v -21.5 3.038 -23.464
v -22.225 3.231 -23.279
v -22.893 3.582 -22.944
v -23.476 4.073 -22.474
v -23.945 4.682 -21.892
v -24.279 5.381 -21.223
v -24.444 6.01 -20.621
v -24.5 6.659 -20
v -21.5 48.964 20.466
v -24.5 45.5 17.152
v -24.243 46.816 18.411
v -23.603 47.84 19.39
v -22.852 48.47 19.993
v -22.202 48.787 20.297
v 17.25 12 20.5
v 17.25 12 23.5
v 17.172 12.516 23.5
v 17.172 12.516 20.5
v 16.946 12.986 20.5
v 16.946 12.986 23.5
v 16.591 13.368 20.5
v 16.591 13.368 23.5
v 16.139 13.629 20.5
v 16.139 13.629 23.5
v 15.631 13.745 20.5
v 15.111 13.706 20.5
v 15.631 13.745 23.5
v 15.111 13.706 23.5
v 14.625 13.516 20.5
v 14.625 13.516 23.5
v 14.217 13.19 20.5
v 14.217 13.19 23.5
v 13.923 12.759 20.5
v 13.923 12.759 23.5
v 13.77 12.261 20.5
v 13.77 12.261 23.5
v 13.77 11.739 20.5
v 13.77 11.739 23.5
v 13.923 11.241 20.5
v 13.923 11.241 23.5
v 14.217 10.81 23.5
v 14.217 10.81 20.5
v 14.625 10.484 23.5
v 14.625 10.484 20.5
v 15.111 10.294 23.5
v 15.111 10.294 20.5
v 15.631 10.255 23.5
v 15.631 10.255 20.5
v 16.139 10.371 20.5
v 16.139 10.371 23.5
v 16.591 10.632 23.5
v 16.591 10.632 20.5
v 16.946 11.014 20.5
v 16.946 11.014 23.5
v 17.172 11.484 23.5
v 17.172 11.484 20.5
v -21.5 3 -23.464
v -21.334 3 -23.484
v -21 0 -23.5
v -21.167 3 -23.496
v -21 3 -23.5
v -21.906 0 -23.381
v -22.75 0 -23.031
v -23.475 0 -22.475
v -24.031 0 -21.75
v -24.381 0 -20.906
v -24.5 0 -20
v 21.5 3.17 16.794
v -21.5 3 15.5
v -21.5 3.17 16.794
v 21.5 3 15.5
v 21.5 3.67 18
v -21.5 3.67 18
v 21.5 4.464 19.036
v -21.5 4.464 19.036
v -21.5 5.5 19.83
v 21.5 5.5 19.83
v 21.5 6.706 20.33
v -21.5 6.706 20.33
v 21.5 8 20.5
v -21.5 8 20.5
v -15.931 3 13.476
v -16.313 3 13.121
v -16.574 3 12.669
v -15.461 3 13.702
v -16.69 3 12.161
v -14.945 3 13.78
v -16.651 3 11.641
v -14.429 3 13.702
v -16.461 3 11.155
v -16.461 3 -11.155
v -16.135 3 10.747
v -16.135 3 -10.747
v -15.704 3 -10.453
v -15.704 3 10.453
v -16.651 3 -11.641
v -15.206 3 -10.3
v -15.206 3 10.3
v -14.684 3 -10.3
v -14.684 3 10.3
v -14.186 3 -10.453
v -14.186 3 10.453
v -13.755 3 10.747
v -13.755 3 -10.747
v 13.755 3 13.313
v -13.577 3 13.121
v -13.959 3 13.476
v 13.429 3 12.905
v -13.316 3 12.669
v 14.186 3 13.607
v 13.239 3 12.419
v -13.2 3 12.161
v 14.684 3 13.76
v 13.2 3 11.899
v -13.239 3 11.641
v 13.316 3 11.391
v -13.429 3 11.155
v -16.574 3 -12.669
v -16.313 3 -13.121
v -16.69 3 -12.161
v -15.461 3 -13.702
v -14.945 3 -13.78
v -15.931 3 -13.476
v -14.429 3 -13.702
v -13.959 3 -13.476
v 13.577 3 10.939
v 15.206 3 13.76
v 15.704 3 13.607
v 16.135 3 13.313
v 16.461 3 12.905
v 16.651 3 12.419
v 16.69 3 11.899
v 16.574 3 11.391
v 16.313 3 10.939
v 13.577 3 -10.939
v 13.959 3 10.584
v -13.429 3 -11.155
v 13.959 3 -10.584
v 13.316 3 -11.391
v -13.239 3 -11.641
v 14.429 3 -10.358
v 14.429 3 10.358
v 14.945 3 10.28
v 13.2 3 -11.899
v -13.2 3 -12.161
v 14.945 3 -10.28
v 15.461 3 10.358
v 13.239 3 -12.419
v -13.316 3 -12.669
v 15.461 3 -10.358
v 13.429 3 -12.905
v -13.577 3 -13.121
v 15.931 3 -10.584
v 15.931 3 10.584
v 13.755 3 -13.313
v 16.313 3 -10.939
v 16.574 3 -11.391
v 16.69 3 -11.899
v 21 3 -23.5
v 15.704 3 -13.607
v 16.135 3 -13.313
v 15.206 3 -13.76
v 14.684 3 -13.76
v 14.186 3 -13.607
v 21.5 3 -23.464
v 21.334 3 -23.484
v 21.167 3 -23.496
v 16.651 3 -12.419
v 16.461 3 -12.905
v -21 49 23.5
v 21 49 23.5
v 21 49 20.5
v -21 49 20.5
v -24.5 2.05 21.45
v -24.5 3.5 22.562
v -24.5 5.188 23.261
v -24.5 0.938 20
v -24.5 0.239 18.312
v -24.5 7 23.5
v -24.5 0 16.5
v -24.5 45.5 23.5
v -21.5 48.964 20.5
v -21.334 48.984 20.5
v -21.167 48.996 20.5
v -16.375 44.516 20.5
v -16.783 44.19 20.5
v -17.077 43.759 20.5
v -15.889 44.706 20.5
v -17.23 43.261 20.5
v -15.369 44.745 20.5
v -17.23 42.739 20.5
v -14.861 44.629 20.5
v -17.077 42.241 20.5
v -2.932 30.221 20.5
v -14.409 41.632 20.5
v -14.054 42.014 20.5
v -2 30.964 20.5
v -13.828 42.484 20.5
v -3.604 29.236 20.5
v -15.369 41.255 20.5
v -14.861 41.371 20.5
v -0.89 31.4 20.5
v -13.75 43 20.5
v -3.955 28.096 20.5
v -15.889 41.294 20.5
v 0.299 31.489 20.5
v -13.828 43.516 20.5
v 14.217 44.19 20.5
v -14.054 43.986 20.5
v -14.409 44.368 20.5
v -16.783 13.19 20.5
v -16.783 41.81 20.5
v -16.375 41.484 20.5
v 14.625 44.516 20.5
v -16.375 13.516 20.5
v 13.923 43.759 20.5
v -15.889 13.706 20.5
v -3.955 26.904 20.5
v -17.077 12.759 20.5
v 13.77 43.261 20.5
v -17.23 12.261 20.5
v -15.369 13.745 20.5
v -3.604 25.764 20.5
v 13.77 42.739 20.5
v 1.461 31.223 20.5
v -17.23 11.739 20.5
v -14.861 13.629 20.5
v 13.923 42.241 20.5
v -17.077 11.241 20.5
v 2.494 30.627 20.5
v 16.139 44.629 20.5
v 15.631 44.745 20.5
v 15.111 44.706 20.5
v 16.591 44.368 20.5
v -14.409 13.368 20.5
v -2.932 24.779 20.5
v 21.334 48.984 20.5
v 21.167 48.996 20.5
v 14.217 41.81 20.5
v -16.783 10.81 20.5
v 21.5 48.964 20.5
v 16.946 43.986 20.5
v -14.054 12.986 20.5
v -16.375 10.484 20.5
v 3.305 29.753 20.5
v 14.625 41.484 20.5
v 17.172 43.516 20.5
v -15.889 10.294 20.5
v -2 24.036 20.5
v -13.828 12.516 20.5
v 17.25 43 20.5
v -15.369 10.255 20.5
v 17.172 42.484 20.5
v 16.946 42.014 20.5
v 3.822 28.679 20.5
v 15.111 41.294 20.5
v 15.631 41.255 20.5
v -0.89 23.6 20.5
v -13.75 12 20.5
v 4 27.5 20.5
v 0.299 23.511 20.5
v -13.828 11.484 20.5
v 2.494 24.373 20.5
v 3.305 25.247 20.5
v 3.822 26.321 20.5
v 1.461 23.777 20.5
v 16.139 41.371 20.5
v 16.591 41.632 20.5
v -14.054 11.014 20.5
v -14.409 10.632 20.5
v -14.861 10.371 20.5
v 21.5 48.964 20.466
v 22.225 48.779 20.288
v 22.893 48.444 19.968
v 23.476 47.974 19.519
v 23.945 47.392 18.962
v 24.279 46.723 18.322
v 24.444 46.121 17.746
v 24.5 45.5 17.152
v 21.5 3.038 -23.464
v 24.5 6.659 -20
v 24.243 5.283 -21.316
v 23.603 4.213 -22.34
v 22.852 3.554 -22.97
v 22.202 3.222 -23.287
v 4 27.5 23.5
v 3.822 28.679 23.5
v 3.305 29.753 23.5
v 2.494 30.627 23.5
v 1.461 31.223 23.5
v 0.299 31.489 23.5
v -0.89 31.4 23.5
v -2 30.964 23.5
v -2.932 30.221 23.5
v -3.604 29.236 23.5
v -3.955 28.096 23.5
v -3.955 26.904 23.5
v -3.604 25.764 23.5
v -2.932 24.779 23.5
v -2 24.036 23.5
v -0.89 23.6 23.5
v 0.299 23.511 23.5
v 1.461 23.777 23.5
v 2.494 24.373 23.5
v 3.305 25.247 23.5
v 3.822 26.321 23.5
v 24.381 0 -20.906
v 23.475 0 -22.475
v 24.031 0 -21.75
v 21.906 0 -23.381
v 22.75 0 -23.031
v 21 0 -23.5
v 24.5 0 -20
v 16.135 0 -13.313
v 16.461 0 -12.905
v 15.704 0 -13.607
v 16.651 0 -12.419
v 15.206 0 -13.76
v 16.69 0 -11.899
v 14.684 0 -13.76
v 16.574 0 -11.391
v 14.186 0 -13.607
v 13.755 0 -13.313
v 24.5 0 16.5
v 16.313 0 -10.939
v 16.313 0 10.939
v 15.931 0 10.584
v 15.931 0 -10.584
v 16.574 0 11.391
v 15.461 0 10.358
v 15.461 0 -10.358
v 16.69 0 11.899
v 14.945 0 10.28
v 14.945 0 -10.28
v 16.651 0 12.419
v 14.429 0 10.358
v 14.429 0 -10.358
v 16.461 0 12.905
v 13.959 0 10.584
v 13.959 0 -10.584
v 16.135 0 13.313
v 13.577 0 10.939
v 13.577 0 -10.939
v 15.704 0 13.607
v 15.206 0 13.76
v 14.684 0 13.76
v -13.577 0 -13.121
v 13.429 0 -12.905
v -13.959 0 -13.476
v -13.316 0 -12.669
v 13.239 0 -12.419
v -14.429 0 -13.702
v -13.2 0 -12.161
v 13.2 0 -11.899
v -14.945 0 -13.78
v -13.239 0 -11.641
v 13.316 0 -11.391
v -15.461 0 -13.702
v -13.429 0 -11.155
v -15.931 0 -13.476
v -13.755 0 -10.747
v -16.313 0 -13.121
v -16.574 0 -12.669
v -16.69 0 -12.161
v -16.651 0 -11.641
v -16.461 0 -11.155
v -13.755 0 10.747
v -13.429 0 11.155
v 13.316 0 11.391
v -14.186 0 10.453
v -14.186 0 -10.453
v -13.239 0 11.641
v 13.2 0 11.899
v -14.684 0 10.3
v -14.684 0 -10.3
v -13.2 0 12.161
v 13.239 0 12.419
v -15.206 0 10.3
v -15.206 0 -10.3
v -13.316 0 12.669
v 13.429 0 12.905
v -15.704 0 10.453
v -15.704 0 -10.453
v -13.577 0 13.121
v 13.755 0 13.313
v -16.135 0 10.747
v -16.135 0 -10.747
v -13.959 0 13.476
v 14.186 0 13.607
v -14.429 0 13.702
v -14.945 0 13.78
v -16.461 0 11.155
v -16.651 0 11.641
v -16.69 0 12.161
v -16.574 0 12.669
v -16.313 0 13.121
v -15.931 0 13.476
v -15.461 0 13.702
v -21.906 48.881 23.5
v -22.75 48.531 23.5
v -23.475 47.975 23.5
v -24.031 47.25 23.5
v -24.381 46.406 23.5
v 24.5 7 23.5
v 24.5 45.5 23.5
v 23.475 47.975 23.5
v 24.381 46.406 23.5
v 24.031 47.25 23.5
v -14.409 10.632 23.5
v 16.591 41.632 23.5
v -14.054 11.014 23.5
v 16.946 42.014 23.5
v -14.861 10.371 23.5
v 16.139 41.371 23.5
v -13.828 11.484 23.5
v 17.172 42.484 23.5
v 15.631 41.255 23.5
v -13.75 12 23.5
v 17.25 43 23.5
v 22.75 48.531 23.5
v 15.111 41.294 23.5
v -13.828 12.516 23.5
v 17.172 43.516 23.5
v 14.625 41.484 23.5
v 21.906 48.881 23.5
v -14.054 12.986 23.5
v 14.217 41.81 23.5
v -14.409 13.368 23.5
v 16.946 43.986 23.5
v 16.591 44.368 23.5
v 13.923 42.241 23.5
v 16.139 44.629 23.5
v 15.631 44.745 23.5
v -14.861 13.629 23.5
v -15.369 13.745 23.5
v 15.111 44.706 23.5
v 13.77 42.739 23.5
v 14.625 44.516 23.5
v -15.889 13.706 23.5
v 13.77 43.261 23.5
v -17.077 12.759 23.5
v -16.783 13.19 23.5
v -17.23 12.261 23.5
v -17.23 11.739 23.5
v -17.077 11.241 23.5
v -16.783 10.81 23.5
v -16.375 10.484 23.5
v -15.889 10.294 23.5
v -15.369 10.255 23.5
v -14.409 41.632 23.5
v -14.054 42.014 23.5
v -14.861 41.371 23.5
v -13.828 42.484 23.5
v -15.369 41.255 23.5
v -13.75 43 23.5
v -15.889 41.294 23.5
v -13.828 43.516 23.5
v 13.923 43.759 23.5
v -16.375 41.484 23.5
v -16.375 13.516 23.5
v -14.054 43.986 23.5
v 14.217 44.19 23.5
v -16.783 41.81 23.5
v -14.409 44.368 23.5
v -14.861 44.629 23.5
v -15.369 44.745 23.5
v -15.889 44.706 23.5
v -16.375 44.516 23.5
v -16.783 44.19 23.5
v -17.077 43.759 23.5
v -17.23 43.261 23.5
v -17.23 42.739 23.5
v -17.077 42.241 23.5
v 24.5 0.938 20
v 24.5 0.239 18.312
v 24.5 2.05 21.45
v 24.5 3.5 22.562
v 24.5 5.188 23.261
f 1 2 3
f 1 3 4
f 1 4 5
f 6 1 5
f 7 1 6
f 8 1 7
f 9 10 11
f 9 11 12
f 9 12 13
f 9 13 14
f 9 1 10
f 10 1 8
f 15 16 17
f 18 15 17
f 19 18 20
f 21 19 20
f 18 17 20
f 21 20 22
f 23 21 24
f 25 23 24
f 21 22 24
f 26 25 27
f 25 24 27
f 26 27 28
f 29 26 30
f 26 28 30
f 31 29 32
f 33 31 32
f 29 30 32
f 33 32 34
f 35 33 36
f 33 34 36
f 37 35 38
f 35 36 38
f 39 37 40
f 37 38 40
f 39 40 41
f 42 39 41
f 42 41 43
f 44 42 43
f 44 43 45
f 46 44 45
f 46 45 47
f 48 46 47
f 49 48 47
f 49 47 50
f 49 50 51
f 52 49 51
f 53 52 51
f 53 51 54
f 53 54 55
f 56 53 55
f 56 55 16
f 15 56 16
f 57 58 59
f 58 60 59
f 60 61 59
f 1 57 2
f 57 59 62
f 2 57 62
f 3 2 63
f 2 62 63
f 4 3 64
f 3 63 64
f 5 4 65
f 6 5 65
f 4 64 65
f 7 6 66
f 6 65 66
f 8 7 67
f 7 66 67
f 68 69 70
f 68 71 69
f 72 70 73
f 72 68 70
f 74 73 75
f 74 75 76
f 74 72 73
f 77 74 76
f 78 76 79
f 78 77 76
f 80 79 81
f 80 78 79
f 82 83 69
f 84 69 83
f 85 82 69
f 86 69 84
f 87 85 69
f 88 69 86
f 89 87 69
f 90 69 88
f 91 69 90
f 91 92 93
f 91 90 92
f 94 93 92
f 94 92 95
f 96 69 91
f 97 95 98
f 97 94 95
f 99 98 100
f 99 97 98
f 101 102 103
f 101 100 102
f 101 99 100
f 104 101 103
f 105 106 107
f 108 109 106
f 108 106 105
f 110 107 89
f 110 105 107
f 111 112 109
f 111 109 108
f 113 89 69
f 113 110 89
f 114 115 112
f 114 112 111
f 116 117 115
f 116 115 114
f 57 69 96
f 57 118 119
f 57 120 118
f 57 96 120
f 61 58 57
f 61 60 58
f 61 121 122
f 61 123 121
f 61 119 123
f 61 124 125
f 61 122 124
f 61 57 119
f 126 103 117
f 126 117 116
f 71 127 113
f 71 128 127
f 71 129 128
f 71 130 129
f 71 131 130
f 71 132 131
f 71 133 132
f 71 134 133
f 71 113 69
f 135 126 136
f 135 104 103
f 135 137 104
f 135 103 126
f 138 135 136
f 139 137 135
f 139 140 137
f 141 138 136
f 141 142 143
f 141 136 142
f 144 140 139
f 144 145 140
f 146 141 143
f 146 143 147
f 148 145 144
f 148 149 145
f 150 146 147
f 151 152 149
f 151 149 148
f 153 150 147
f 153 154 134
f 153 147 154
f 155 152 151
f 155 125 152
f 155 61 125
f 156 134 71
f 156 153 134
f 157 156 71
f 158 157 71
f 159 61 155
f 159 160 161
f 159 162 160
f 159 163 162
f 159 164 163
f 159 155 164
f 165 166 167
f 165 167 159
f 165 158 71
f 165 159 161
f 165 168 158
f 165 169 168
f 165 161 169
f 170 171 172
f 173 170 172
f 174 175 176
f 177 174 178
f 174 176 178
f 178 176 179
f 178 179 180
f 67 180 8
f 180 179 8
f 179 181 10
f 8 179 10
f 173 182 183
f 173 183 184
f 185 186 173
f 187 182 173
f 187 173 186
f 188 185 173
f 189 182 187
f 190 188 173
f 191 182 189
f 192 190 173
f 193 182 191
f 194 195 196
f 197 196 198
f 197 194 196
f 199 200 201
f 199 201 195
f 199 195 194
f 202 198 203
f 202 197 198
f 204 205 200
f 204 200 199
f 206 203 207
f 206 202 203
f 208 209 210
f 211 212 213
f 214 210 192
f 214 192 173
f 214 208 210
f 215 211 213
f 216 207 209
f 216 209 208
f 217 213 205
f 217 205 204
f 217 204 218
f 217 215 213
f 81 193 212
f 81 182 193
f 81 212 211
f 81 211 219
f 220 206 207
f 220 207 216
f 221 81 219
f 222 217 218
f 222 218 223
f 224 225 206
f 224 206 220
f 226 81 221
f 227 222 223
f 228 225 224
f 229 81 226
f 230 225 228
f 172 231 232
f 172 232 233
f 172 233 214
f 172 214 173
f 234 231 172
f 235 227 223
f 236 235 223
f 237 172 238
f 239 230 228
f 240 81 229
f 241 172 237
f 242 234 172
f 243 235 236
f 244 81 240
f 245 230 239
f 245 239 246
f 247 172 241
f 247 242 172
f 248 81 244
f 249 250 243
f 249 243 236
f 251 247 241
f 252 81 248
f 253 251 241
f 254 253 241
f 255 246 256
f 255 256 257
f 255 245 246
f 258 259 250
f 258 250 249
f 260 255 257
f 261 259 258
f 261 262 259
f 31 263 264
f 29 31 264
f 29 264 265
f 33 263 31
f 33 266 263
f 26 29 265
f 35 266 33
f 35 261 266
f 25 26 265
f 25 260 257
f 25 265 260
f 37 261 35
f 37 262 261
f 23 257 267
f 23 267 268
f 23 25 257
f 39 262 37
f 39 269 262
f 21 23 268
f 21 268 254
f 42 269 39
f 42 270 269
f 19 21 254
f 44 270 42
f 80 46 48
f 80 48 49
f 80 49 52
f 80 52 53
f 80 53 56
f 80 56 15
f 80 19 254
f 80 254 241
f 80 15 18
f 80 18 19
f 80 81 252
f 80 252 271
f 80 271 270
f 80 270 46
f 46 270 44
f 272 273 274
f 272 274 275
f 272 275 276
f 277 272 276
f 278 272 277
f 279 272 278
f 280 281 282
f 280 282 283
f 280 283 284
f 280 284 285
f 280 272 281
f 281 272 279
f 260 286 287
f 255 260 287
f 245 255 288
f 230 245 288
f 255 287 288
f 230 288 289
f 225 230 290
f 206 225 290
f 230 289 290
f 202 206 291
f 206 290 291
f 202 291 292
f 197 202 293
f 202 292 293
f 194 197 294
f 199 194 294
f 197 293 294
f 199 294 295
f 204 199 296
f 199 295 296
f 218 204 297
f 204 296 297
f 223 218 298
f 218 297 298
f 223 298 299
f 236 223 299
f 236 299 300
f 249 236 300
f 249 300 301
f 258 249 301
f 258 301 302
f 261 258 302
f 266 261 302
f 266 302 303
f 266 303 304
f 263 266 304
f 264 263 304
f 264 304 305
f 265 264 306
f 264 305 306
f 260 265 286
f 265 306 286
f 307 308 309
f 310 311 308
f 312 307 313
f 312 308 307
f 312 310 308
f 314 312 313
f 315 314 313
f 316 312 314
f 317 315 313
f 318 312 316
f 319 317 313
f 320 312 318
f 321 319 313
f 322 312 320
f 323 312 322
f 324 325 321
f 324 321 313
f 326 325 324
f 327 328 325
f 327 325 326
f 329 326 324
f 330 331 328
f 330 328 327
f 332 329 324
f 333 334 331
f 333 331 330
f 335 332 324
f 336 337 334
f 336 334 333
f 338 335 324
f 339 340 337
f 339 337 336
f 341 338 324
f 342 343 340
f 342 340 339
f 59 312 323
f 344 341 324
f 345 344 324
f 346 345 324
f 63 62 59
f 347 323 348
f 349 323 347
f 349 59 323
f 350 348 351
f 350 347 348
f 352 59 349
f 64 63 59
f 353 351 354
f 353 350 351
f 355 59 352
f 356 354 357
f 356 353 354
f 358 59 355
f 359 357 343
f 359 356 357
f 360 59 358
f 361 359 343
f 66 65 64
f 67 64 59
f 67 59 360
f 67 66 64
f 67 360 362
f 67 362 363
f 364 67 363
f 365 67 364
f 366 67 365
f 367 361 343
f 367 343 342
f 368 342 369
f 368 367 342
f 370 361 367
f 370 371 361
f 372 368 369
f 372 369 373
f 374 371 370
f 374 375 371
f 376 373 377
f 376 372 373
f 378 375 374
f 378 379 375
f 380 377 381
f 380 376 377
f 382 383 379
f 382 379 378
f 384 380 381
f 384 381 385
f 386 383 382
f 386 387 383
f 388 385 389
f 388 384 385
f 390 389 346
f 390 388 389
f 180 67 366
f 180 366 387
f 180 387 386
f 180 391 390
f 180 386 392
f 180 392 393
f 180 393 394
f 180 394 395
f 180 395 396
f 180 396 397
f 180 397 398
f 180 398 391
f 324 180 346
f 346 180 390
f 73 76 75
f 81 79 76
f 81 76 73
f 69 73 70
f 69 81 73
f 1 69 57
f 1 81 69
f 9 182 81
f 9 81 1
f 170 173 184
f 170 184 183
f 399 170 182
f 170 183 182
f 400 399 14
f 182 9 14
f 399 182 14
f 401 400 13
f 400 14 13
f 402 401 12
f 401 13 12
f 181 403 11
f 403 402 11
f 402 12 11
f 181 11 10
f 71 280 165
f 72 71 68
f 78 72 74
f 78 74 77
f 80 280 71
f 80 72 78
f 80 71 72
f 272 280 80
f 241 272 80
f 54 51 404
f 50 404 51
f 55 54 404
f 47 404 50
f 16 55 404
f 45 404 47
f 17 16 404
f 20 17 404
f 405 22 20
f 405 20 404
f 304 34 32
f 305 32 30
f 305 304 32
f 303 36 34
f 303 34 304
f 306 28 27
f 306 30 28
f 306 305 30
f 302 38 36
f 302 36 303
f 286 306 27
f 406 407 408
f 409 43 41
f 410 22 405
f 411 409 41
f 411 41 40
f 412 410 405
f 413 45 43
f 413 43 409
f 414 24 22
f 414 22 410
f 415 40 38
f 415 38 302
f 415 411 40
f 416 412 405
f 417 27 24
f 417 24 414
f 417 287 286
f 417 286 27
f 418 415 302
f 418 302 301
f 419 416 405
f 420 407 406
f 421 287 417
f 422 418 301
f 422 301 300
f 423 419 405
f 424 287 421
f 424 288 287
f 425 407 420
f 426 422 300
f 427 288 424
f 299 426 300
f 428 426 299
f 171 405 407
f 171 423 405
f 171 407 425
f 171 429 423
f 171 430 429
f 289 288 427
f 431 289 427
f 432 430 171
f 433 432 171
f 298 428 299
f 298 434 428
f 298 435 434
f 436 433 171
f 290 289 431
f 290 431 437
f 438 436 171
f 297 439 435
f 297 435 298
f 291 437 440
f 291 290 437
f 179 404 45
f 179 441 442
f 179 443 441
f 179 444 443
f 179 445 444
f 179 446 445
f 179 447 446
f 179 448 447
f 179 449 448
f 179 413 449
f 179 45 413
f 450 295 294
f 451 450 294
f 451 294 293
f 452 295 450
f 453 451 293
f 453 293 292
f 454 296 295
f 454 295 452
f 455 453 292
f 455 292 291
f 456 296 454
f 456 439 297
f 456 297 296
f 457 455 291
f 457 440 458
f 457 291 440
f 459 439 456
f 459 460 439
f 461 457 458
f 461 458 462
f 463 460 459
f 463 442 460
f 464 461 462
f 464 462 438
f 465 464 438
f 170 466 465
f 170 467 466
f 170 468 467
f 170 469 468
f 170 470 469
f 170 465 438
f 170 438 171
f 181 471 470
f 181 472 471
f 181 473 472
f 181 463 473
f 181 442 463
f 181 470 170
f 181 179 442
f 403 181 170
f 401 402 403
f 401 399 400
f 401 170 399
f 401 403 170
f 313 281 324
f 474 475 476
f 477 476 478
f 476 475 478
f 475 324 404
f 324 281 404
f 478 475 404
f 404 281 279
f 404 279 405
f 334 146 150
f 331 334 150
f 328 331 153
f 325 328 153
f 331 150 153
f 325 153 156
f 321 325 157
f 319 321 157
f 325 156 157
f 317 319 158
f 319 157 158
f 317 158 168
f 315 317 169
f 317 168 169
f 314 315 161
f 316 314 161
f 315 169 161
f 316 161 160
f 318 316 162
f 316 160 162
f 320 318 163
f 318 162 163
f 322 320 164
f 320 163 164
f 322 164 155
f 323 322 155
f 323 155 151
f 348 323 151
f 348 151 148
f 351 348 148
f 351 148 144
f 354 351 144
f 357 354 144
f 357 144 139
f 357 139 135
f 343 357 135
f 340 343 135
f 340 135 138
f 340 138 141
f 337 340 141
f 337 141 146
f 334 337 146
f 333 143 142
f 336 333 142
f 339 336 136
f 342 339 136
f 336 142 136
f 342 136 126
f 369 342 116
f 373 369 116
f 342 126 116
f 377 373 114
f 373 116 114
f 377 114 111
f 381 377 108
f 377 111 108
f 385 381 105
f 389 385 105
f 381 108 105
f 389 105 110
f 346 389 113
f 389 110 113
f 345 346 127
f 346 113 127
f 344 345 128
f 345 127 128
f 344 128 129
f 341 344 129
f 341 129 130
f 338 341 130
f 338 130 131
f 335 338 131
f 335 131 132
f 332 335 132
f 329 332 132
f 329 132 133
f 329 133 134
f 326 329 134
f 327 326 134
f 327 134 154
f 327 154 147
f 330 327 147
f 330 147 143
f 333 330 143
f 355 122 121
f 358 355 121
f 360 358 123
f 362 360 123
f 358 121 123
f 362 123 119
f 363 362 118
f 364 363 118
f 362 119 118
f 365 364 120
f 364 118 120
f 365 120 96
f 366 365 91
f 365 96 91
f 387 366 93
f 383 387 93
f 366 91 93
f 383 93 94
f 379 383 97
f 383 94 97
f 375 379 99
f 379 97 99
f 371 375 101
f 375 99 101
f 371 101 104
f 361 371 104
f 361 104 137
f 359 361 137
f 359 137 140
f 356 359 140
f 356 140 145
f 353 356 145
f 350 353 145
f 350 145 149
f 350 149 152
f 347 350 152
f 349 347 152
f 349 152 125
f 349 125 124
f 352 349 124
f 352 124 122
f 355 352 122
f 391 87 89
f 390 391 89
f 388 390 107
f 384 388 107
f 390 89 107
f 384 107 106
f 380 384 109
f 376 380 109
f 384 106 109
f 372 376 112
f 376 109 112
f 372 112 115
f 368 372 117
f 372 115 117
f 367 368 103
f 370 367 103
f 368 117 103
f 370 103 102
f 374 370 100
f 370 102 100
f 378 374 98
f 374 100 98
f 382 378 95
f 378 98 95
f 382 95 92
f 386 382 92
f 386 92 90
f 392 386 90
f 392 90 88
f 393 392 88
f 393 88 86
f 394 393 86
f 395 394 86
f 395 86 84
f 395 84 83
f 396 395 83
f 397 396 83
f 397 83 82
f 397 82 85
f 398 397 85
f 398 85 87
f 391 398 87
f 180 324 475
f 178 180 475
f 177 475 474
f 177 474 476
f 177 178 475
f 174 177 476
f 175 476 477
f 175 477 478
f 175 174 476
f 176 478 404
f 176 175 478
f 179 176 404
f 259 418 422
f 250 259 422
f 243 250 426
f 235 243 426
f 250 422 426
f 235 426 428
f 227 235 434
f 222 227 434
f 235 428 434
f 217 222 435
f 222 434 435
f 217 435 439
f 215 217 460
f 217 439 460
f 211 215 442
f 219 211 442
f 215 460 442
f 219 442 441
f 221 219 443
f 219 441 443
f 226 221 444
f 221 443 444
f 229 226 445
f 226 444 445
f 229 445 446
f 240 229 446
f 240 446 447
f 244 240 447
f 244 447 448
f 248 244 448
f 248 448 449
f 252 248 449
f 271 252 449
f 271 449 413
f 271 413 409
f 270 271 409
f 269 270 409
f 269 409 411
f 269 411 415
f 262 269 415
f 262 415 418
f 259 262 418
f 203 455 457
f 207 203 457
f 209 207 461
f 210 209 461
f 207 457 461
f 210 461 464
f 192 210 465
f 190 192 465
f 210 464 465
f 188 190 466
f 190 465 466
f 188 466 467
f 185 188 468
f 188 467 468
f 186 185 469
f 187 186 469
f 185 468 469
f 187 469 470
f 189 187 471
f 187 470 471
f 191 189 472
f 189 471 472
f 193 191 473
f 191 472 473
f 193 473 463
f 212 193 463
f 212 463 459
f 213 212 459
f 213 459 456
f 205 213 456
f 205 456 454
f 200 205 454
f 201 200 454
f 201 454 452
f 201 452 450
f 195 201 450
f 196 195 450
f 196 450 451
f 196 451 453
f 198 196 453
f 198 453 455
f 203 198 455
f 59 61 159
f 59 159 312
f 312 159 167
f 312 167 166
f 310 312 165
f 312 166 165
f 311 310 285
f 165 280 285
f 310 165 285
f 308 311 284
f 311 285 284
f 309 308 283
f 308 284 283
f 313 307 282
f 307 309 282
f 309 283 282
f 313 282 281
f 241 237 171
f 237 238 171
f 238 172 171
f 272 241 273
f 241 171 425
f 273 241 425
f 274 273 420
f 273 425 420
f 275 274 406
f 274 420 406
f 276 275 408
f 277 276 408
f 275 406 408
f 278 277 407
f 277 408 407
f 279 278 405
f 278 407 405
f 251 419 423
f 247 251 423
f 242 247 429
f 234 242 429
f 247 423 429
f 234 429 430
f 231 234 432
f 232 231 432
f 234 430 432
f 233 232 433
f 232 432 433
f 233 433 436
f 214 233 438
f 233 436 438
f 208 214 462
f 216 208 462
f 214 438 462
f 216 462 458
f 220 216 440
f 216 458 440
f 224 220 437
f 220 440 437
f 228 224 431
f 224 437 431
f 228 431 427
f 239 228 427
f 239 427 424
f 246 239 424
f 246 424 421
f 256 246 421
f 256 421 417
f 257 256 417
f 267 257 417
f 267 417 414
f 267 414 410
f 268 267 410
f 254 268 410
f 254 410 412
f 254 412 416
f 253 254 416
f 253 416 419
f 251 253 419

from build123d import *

# Parameters (mm, degrees)
ESBO_O1_W                = 43
ESBO_O1_H                = 47
RESSALTO_EXTRUS_O1_DEPTH = 3
ESBO_O2_W                = 43
ESBO_O2_H                = 3
RESSALTO_EXTRUS_O2_DEPTH = 46
ESBO_O3_R                = 1.75
CORTE_EXTRUS_O1_DEPTH    = 56.950871307
ESBO_O4_R                = 1.75
CORTE_EXTRUS_O2_DEPTH    = 72.219730412
RESSALTO_EXTRUS_O3_DEPTH = 3
RESSALTO_EXTRUS_O4_DEPTH = 3
ESBO_O7_R                = 4
CORTE_EXTRUS_O3_DEPTH    = 3
FILETE1_R                = 3.5
FILETE2_R                = 7
FILETE3_R                = 3.5
FILETE4_R                = 5


with BuildPart() as part:
    # Esboço1 → Ressalto-extrusão1 (new body)
    with BuildSketch(Plane(origin=(0, 0, 0), x_dir=(1, 0, 0), z_dir=(0, 1, 0))):
        Rectangle(ESBO_O1_W, ESBO_O1_H)
    extrude(amount=RESSALTO_EXTRUS_O1_DEPTH)

    # Esboço2 → Ressalto-extrusão2 (add)
    with BuildSketch(Plane(origin=(0, 3, 0), x_dir=(1, 0, 0), z_dir=(0, 1, 0))):
        with Locations((0, -22)):
            Rectangle(ESBO_O2_W, ESBO_O2_H)
    extrude(amount=RESSALTO_EXTRUS_O2_DEPTH)

    # Esboço3 → Corte-extrusão1 (cut, through all)
    with BuildSketch(Plane(origin=(0, 3, 0), x_dir=(1, 0, 0), z_dir=(0, 1, 0))):
        with Locations(Location((14.945, 12.03, 0), (0, 0, 270))):
            Circle(ESBO_O3_R)
        with Locations(Location((14.945, -12.03, 0), (0, 0, 90))):
            Circle(ESBO_O3_R)
        with Locations(Location((-14.945, -12.03, 0), (0, 0, 270))):
            Circle(ESBO_O3_R)
        with Locations(Location((-14.945, 12.03, 0), (0, 0, 90))):
            Circle(ESBO_O3_R)
    extrude(amount=-CORTE_EXTRUS_O1_DEPTH, mode=Mode.SUBTRACT)

    # Esboço4 → Corte-extrusão2 (cut, through all)
    with BuildSketch(Plane.XY.offset(23.5)):
        with Locations((-15.5, 43)):
            Circle(ESBO_O4_R)
        with Locations((15.5, 43)):
            Circle(ESBO_O4_R)
        with Locations((-15.5, 12)):
            Circle(ESBO_O4_R)
        with Locations((15.5, 12)):
            Circle(ESBO_O4_R)
    extrude(amount=-CORTE_EXTRUS_O2_DEPTH, mode=Mode.SUBTRACT)

    # Esboço5 → Ressalto-extrusão3 (add)
    with BuildSketch(Plane.ZY.offset(21.5)):
        Polygon((-23.5, 0), (-23.5, 3), (20.5, 49), (23.5, 49), (23.5, 0), align=None)
    extrude(amount=RESSALTO_EXTRUS_O3_DEPTH)

    # Esboço6 → Ressalto-extrusão4 (add)
    with BuildSketch(Plane(origin=(21.5, 0, 0), x_dir=(0, 0, -1), z_dir=(1, 0, 0))):
        Polygon((23.5, 0), (-23.5, 0), (-23.5, 49), (-20.5, 49), (23.5, 3), align=None)
    extrude(amount=RESSALTO_EXTRUS_O4_DEPTH)

    # Esboço7 → Corte-extrusão3 (cut)
    with BuildSketch(Plane.XY.offset(23.5)):
        with Locations((0, 27.5)):
            Circle(ESBO_O7_R)
    extrude(amount=-CORTE_EXTRUS_O3_DEPTH, mode=Mode.SUBTRACT)

    # Filete1
    # the kernel refuses this fillet: 3.5 mm, written as the material it takes off along each edge
    with BuildSketch(Plane(origin=(-24.5, 49, 11.75), x_dir=(1, 0, 0), z_dir=(0, 0, 1)), Plane(origin=(24.5, 49, 32.25), x_dir=(-1, 0, 0), z_dir=(0, 0, -1))) as filete1_piece_1:
        with BuildLine():
            CenterArc((FILETE1_R, -FILETE1_R), FILETE1_R, 90, 90)
            Line((0, -FILETE1_R), (0, 0))
            Line((0, 0), (FILETE1_R, 0))
        make_face()
    extrude(amount=20.5, mode=Mode.SUBTRACT)

    # Filete2
    filete2_edges = [part.edges().sort_by_distance(p)[0] for p in [
        (0, 0, 23.5),
    ]]
    fillet(filete2_edges, radius=FILETE2_R)

    # Filete3
    # the kernel refuses this fillet: 3.5 mm, written as the material it takes off along each edge
    with BuildSketch(Plane(origin=(-24.5, -8.75, -23.5), x_dir=(0, 0, 1), z_dir=(0, 1, 0)), Plane(origin=(24.5, 11.75, -23.5), x_dir=(0, 0, 1), z_dir=(0, -1, 0))) as filete3_piece_1:
        with BuildLine():
            CenterArc((FILETE3_R, FILETE3_R), FILETE3_R, 180, 90)
            Line((0, FILETE3_R), (0, 0))
            Line((0, 0), (FILETE3_R, 0))
        make_face()
    extrude(amount=20.5, mode=Mode.SUBTRACT)

    # Filete4
    filete4_edges = [part.edges().sort_by_distance(p)[0] for p in [
        (0, 3, 20.5),
    ]]
    fillet(filete4_edges, radius=FILETE4_R)


solid = part.part
